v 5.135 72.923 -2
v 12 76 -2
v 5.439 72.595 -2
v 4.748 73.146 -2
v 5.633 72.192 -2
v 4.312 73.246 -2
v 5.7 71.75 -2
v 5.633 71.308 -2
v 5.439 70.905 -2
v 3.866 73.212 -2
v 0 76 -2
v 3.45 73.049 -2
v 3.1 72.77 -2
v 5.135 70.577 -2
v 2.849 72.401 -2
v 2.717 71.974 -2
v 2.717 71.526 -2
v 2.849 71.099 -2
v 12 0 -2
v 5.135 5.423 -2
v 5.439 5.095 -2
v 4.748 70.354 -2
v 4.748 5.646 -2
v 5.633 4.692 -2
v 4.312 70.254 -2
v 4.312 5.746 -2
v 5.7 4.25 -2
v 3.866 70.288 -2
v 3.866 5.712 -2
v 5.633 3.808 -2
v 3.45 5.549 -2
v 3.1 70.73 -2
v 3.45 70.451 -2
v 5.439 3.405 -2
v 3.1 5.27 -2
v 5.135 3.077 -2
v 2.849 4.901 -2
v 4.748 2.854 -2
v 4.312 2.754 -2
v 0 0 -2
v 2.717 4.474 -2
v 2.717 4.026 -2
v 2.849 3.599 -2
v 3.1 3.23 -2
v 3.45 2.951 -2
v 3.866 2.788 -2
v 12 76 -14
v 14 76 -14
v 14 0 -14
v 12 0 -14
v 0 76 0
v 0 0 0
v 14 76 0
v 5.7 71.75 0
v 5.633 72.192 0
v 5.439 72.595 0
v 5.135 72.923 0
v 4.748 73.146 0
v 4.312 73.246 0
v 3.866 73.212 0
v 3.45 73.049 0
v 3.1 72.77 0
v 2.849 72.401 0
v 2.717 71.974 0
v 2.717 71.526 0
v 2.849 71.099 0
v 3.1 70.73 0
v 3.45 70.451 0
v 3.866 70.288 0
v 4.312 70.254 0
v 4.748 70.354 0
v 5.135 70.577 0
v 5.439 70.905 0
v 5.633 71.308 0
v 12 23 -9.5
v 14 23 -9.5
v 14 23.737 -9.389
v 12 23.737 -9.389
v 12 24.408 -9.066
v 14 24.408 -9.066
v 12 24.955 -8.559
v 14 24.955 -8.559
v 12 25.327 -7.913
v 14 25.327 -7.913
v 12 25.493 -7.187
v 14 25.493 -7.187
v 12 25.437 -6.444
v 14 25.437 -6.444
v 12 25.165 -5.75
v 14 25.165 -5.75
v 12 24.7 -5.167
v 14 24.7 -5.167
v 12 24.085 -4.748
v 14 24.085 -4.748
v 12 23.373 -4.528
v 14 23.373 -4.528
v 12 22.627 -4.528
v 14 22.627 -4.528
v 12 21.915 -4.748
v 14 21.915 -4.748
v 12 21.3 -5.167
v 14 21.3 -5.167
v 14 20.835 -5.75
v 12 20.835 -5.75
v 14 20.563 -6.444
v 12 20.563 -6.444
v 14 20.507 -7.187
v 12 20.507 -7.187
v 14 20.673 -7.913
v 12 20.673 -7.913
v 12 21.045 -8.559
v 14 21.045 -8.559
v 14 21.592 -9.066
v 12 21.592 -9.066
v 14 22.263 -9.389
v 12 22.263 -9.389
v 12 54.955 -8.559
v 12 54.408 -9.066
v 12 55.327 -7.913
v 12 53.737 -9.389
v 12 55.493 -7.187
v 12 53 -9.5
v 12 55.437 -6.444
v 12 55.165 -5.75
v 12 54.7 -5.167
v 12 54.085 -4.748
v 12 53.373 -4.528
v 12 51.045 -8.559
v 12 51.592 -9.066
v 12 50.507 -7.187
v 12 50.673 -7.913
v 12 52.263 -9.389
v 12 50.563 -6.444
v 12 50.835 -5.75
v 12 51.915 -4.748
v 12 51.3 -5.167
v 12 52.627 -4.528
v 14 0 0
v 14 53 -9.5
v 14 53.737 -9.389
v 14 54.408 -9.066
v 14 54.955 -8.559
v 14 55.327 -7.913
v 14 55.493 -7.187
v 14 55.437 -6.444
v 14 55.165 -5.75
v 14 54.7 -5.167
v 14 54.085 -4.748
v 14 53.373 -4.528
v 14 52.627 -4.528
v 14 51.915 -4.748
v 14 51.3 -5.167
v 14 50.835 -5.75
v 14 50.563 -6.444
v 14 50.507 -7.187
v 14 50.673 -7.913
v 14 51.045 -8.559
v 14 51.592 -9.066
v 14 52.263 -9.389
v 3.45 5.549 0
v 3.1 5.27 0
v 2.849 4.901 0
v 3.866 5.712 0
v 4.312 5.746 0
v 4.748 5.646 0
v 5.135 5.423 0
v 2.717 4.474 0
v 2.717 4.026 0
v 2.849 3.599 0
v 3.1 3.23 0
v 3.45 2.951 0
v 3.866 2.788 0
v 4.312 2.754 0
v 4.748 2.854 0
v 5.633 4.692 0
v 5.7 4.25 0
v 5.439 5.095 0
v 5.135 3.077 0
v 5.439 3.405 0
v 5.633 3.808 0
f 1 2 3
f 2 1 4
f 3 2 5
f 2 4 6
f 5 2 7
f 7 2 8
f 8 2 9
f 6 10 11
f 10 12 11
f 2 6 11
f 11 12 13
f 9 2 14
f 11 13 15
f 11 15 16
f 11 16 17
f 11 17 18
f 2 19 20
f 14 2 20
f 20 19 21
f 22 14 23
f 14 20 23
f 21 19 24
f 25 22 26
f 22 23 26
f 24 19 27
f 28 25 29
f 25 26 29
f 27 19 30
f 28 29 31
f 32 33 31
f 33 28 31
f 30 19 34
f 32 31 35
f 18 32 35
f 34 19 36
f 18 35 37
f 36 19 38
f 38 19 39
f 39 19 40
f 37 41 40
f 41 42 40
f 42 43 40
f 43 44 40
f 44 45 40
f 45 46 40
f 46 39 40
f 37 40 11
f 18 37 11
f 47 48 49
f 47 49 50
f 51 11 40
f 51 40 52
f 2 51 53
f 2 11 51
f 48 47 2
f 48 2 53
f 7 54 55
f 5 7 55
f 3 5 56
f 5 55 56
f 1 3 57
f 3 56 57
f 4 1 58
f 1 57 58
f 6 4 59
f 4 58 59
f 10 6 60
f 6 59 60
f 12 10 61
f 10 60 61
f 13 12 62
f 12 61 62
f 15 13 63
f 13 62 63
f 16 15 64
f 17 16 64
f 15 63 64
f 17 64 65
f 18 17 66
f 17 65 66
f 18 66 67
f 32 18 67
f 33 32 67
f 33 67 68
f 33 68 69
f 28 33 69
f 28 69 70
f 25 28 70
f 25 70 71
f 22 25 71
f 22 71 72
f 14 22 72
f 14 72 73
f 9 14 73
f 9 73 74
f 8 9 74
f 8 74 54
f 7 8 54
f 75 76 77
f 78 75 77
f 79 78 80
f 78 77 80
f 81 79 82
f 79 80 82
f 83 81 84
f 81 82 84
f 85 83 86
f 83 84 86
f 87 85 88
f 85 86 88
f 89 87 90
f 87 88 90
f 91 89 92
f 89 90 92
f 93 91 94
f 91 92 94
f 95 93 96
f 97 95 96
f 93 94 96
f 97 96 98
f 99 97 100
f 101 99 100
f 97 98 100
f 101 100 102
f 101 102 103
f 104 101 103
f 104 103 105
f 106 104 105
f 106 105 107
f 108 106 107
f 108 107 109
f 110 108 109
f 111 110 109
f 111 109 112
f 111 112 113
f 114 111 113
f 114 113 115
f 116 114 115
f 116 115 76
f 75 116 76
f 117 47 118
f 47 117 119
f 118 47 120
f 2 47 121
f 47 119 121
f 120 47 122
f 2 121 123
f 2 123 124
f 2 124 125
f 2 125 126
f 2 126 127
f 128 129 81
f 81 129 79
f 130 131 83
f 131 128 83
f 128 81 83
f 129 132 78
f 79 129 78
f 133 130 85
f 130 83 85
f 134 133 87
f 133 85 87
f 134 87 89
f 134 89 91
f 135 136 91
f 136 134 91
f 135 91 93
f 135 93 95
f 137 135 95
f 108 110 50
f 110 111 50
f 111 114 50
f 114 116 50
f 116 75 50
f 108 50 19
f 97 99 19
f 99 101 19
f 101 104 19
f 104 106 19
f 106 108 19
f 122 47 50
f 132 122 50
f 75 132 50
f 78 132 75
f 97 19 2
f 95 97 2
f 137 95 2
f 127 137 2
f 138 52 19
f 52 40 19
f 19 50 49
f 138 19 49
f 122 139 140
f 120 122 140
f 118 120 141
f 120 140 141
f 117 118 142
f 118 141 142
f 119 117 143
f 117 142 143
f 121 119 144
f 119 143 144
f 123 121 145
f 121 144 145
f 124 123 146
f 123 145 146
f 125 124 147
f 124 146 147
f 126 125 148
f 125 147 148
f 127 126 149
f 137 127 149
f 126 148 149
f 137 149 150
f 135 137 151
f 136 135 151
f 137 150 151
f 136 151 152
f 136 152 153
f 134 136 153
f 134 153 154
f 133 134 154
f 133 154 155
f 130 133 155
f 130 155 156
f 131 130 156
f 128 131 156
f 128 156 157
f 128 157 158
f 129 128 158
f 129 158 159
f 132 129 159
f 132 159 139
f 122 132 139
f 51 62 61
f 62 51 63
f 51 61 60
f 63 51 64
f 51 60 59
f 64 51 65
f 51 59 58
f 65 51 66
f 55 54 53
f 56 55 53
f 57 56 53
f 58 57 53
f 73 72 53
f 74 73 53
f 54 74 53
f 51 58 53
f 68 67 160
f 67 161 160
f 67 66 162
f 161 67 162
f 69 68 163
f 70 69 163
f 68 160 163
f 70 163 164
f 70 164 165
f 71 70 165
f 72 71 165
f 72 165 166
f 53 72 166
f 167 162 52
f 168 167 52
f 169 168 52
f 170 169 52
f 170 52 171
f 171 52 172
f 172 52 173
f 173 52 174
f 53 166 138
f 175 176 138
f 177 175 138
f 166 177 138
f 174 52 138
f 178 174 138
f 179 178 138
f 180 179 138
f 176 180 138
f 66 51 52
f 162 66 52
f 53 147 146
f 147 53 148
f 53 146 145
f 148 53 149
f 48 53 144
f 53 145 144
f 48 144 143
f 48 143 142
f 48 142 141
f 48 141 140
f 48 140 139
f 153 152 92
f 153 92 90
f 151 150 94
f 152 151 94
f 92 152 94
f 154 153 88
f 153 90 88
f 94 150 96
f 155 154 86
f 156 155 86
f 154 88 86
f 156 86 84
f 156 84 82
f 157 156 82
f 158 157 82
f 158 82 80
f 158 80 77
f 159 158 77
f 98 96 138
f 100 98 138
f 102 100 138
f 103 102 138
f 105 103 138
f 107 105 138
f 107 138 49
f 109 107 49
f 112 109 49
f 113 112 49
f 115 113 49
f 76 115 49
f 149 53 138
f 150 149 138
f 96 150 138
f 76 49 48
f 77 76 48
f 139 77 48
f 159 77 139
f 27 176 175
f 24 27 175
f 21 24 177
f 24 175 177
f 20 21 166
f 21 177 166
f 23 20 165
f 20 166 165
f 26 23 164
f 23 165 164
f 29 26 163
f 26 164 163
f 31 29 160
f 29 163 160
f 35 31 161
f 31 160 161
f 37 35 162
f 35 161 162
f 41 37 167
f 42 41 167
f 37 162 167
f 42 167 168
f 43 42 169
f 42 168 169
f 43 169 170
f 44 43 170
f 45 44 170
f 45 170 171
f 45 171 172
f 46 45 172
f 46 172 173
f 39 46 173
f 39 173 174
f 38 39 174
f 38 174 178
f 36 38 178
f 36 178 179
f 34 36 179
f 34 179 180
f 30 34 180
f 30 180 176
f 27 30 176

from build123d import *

# Parameters (mm, degrees)
EXTRUDE_1_DEPTH     = 76
SKETCH_2_R          = 1.5
CUT_EXTRUDE_1_DEPTH = 76
SKETCH_3_R          = 2.5
CUT_EXTRUDE_2_DEPTH = 76


with BuildPart() as part:
    # 草图1 → 凸台-拉伸1 (new body)
    with BuildSketch(Plane(origin=(0, 0, 0), x_dir=(1, 0, 0), z_dir=(0, 1, 0))):
        Polygon((0, 0), (14, 0), (14, 14), (12, 14), (12, 2), (0, 2), align=None)
    extrude(amount=EXTRUDE_1_DEPTH)

    # 草图2 → 切除-拉伸1 (cut)
    with BuildSketch(Plane.XY):
        with Locations((4.2, 4.25)):
            Circle(SKETCH_2_R)
        with Locations((4.2, 71.75)):
            Circle(SKETCH_2_R)
    extrude(amount=-CUT_EXTRUDE_1_DEPTH, mode=Mode.SUBTRACT)

    # 草图3 → 切除-拉伸2 (cut)
    with BuildSketch(Plane(origin=(14, 0, 0), x_dir=(0, 0, -1), z_dir=(1, 0, 0))):
        with Locations((7, 23)):
            Circle(SKETCH_3_R)
        with Locations((7, 53)):
            Circle(SKETCH_3_R)
    extrude(amount=-CUT_EXTRUDE_2_DEPTH, mode=Mode.SUBTRACT)


solid = part.part
